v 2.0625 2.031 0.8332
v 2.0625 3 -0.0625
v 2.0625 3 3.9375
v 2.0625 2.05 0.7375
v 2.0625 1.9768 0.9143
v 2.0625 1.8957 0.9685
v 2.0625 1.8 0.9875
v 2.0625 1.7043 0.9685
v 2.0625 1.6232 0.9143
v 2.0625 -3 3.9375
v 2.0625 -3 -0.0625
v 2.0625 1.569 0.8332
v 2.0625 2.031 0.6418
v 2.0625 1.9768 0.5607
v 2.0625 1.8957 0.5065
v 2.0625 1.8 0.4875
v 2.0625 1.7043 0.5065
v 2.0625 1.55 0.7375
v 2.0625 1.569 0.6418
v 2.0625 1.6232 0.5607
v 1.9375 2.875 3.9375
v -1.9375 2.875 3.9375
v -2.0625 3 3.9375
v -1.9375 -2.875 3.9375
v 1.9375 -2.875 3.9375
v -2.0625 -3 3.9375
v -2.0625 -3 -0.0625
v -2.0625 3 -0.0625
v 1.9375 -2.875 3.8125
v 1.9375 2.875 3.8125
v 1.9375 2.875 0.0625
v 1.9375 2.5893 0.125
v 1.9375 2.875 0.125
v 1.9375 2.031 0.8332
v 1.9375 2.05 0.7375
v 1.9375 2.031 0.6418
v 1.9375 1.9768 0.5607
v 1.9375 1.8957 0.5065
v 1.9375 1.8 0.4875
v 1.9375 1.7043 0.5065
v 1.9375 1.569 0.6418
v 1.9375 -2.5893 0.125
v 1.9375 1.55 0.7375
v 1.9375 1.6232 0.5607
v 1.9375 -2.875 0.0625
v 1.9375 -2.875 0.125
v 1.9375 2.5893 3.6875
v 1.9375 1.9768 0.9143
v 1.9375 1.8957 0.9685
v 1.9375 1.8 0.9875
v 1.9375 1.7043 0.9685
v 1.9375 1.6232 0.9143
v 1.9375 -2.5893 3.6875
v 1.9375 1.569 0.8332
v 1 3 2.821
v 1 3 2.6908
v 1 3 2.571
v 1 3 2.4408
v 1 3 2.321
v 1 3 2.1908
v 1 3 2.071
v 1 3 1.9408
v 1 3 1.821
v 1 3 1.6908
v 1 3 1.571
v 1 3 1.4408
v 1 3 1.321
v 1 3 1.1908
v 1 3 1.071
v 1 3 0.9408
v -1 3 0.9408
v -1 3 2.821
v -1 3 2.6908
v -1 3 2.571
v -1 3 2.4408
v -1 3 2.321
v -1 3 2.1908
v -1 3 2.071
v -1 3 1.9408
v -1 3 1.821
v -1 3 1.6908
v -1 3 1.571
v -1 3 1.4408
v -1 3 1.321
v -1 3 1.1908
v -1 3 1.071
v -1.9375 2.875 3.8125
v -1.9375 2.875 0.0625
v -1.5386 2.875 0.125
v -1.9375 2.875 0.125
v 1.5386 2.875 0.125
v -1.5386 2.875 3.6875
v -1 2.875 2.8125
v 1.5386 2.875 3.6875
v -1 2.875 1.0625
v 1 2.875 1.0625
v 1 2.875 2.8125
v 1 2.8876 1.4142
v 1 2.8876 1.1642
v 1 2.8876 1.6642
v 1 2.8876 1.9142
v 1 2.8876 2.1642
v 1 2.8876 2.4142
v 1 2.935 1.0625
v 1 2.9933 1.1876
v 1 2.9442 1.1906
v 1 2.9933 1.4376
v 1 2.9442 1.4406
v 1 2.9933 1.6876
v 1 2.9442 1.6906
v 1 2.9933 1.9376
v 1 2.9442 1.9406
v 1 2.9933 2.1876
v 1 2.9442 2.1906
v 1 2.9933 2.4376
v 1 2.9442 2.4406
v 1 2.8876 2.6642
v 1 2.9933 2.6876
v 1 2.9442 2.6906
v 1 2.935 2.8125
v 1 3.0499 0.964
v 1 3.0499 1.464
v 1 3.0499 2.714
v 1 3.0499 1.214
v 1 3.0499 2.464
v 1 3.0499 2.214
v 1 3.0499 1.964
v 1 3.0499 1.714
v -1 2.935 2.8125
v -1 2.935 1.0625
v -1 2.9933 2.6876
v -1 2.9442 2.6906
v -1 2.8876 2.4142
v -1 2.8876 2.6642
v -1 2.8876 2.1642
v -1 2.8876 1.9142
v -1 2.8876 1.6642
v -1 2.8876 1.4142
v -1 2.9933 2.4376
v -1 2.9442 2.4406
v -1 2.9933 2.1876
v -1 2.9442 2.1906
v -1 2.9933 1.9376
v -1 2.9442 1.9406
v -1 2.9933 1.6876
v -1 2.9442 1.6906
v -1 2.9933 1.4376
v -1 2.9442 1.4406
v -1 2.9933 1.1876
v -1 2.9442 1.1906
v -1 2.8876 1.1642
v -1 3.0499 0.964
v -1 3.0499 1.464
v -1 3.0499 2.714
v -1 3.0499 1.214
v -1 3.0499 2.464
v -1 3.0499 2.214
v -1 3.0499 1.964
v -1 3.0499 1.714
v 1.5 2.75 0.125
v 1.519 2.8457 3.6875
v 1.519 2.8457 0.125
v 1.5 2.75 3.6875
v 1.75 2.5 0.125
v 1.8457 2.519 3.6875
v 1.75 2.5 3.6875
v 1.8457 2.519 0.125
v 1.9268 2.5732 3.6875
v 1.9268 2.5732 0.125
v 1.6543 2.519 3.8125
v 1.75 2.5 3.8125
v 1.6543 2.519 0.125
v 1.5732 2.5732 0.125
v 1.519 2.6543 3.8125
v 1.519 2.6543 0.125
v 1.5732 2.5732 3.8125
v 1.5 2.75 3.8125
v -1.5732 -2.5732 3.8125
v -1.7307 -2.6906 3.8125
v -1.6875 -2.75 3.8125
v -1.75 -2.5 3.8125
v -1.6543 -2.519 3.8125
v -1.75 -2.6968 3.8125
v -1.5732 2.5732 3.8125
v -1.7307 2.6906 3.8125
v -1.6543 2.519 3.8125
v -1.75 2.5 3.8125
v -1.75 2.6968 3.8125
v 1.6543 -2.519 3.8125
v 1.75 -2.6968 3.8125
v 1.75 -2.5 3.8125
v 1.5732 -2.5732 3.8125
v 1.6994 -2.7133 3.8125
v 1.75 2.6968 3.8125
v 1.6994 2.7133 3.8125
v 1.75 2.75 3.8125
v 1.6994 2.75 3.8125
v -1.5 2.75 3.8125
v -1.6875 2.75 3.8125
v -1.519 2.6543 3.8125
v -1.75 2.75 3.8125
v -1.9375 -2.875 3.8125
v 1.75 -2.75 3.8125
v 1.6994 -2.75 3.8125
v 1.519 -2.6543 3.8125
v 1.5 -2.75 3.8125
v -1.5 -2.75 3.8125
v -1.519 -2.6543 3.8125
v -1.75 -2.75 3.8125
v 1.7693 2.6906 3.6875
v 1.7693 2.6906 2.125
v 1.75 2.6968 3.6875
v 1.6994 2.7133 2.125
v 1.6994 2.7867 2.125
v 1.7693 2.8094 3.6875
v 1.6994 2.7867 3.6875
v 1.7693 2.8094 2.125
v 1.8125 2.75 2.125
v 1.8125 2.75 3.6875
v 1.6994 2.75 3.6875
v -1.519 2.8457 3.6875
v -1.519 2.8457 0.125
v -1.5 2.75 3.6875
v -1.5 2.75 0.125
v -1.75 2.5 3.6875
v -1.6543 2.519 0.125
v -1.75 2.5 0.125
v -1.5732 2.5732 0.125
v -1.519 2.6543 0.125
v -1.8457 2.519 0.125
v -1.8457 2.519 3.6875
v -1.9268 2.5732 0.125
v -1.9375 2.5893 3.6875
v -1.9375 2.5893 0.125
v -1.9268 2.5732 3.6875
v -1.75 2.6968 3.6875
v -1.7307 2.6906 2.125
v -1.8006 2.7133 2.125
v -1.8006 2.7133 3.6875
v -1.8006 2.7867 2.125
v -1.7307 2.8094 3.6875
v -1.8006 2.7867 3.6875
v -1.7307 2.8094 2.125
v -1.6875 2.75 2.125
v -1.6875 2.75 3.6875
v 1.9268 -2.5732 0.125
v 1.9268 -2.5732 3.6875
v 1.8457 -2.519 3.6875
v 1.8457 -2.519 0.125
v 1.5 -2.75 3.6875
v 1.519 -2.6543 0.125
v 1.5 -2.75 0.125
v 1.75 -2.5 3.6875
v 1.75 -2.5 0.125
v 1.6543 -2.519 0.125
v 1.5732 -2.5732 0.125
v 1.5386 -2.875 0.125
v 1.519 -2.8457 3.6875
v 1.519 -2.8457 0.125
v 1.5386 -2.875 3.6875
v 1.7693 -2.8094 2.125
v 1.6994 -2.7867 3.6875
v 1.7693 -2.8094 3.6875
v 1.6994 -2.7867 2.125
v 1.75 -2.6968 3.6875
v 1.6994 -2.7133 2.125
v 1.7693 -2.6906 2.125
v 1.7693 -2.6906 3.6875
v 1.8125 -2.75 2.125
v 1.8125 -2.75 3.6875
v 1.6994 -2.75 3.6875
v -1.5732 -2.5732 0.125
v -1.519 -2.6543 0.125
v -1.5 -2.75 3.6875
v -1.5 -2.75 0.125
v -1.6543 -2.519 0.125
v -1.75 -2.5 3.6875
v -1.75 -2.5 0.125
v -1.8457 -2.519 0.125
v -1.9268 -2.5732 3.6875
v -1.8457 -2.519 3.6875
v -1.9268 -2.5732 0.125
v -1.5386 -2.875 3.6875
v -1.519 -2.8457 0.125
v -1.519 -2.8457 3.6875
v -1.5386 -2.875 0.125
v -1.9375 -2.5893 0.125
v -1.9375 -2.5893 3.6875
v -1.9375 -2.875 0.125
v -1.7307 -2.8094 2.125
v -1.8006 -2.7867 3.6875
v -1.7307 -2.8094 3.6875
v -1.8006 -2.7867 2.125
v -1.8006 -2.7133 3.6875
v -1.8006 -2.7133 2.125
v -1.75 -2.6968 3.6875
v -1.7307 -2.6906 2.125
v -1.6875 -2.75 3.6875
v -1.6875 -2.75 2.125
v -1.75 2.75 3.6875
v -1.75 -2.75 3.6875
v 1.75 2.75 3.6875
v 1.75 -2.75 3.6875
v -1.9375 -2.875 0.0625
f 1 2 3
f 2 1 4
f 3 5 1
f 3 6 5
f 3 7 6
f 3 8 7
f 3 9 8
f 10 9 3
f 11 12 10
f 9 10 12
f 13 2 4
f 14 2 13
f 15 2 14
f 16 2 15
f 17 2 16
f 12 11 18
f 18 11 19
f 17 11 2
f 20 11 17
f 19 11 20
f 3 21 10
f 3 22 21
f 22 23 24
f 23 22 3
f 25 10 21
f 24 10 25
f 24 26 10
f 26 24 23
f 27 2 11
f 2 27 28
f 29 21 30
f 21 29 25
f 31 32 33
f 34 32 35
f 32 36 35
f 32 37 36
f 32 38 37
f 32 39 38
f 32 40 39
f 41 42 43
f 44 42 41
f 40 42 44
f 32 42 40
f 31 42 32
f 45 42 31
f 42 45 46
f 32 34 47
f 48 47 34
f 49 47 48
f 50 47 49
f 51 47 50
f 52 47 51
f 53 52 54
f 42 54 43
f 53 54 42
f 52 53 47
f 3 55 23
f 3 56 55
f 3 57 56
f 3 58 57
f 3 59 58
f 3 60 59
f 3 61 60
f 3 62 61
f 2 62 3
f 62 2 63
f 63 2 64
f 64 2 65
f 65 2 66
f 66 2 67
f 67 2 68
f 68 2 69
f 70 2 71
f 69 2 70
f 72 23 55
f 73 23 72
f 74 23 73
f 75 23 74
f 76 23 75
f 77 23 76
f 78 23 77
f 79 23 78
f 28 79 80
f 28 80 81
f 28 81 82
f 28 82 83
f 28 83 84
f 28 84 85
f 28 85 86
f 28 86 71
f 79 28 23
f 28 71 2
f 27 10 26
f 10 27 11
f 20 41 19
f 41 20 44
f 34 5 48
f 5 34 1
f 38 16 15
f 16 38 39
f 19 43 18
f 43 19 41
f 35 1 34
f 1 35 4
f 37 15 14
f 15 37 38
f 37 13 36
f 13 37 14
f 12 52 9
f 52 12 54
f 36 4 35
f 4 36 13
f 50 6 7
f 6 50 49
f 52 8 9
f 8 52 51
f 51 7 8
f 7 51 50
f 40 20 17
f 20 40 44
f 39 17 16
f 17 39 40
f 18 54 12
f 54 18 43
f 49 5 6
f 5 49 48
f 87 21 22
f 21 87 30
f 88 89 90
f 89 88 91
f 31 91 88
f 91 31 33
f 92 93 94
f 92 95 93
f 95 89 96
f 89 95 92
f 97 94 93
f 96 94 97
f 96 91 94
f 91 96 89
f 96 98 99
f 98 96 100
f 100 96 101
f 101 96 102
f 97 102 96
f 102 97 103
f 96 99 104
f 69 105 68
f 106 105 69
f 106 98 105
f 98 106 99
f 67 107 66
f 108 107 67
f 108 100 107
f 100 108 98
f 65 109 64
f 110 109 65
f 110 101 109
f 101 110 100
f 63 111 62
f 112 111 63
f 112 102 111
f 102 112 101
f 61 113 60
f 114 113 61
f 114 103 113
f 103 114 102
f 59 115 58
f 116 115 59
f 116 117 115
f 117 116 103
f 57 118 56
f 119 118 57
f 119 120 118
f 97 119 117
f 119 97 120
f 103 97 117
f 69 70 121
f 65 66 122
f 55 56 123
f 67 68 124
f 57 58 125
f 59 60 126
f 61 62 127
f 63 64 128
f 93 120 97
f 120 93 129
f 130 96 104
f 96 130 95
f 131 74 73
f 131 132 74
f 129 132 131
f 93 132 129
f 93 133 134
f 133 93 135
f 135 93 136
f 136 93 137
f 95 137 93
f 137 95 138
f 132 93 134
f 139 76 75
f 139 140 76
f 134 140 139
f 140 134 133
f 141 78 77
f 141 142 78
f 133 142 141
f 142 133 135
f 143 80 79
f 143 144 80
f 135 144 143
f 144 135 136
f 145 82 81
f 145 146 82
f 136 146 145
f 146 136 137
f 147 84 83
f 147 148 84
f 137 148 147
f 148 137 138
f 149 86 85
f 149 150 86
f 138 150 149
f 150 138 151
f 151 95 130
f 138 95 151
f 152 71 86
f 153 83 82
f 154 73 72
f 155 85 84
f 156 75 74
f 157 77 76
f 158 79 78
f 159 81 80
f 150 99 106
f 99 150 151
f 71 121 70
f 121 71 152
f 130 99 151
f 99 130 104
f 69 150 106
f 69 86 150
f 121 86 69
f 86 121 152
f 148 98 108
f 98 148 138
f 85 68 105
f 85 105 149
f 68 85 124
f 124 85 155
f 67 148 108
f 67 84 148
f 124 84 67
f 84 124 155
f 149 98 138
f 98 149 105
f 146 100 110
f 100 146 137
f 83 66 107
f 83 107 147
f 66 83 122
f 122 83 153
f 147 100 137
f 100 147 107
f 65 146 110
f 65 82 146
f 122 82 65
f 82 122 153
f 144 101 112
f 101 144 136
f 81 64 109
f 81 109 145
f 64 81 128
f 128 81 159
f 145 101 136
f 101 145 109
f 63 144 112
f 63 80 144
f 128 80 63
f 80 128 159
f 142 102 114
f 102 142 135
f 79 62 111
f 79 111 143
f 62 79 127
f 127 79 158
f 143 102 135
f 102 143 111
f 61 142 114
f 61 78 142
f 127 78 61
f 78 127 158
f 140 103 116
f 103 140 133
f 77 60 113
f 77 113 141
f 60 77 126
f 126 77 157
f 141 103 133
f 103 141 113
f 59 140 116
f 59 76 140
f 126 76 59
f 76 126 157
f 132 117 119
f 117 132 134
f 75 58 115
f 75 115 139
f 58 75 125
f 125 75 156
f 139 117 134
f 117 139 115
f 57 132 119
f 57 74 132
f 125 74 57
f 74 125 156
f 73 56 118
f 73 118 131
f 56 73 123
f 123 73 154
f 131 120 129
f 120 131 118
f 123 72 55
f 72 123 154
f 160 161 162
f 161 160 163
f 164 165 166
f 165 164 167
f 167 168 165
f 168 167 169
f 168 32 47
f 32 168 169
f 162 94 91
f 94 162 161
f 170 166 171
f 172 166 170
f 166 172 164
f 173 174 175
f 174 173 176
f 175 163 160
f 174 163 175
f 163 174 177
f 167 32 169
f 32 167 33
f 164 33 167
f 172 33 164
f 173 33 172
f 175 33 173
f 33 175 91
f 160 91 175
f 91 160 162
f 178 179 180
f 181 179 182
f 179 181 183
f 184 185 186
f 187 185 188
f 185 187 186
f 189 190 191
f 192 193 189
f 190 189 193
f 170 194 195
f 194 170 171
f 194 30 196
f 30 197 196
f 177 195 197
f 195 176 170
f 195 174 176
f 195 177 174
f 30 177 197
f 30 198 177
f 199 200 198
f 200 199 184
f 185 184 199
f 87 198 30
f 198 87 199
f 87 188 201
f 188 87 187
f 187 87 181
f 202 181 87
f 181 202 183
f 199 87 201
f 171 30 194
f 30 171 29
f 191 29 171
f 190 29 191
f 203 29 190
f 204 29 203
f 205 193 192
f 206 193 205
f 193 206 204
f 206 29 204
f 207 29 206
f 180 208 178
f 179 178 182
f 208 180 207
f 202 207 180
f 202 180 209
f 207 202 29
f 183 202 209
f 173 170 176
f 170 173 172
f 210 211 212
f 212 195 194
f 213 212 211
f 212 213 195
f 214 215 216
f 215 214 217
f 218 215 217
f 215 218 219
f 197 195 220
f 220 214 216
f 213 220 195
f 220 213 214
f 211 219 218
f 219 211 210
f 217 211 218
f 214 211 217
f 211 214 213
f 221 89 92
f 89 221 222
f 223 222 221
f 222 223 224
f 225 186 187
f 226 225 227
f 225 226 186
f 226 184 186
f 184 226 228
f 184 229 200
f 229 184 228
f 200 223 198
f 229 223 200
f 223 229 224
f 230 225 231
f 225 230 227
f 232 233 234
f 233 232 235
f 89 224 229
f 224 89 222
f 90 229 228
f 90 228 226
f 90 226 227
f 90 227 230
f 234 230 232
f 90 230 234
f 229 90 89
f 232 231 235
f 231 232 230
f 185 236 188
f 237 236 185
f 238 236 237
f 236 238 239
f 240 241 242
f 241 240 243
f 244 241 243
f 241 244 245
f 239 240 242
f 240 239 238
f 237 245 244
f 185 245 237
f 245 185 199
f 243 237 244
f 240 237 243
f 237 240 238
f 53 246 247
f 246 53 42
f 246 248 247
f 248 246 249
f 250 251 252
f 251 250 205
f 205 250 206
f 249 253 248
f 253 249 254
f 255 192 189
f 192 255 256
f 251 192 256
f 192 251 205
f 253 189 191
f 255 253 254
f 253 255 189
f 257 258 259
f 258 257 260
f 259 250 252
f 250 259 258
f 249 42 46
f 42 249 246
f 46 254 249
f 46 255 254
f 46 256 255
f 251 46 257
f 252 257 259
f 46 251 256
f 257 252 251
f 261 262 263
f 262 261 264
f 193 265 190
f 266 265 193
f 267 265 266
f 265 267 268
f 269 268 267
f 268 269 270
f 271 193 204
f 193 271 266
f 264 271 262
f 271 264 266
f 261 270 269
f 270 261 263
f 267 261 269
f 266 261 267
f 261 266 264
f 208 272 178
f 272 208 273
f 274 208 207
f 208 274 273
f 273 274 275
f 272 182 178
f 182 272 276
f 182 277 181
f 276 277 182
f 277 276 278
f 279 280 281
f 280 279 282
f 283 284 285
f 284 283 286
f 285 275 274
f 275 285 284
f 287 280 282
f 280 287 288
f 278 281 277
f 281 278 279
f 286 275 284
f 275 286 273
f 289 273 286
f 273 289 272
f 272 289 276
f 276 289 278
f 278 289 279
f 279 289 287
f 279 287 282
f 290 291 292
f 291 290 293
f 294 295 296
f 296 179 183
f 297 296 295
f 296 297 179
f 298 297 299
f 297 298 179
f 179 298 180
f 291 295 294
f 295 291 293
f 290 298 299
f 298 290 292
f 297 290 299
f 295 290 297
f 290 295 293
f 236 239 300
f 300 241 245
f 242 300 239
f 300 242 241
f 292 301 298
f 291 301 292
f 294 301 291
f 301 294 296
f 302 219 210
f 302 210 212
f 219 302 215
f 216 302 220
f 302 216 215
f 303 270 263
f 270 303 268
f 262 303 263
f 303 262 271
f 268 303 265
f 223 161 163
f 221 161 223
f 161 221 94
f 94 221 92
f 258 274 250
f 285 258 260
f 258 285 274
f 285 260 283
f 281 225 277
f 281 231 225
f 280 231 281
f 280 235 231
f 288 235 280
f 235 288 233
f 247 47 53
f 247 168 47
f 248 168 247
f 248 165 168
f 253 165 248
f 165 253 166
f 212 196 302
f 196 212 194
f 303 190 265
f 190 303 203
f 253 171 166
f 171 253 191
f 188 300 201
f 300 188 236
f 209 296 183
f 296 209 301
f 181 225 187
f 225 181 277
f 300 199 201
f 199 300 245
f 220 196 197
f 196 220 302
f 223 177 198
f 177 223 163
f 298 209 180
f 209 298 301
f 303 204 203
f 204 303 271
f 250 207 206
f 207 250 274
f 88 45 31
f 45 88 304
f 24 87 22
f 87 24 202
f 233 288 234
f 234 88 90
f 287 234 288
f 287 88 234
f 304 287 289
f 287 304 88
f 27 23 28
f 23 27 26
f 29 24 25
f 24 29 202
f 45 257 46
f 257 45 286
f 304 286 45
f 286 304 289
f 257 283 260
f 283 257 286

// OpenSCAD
//project box with louvers
//cylinder posts on the sides
$fa =1;
$fs =0.1;
fz = 0.25;
w_box =4;
l_box =6;
h_box =4;
t_box = .125;//thickness
c_size = .25;//post radius
l_angle = 25;//angle of louver from vertical
l_width = .25;//width of each louver
l_num = 8;//number of louvers
posts = [[1,1],[-1,1],[1,-1],[-1,-1]];
//bottom of the box
cube([w_box,l_box,t_box], center = true);
//first side
//include hole for power cord
translate([(w_box/2),0,(h_box/2)-t_box/2])
    difference(){
    cube([t_box,l_box,h_box],center=true);
    rotate([0,90,0])
    translate([h_box*.3,l_box*.3,0])
    cylinder(t_box+fz,r=.25,center=true);//1/2" hole for power cable gland
    }
//opposite side
translate([(-w_box/2),0,(h_box/2)-t_box/2])
    cube([t_box,l_box,h_box],center=true);
//short side
translate([0,-l_box/2+t_box/2,(h_box/2)-t_box/2])
    cube([w_box,t_box,h_box],center=true);
//opposide short side
translate([0,l_box/2-t_box/2,(h_box/2)-t_box/2])
    difference(){
    cube([w_box,t_box,h_box],center=true);
    //louver frame
    cube ([w_box*0.5,t_box+fz,0.75*l_num*l_width+fz],center=true);
    }
    //loover
    translate([0,l_box/2-t_box/4,h_box/2-(0.5*l_num*l_width)+t_box/1.95])
for (i = [0:l_num-1]){
    translate([0,0,i*(l_width*1.)])//todo:do the trig function instead of hardcode width
    rotate([l_angle,0,0])
    //color([0,0,1])//to make it easy to debug
    cube([w_box*0.5,t_box*.5,l_width],center = true);
}
//cylinder posts
for (i = [0:3]){
translate ([(posts[i][0]*w_box/2)-posts[i][0]*fz,(posts[i][1]*l_box/2)-posts[i][1]*fz,t_box])
    difference(){
    cylinder(h = h_box-2.5*t_box,r = c_size);
    translate([0,0,h_box/2])
    cylinder(h=2,r=0.0625);//screw hole
    }
}
//top lip
translate([0,0,h_box-2*t_box])
   difference()   {
   cube([w_box,l_box,t_box], center = true);
   cube([w_box-.5,l_box-.5,t_box+fz], center = true);}


   
   
